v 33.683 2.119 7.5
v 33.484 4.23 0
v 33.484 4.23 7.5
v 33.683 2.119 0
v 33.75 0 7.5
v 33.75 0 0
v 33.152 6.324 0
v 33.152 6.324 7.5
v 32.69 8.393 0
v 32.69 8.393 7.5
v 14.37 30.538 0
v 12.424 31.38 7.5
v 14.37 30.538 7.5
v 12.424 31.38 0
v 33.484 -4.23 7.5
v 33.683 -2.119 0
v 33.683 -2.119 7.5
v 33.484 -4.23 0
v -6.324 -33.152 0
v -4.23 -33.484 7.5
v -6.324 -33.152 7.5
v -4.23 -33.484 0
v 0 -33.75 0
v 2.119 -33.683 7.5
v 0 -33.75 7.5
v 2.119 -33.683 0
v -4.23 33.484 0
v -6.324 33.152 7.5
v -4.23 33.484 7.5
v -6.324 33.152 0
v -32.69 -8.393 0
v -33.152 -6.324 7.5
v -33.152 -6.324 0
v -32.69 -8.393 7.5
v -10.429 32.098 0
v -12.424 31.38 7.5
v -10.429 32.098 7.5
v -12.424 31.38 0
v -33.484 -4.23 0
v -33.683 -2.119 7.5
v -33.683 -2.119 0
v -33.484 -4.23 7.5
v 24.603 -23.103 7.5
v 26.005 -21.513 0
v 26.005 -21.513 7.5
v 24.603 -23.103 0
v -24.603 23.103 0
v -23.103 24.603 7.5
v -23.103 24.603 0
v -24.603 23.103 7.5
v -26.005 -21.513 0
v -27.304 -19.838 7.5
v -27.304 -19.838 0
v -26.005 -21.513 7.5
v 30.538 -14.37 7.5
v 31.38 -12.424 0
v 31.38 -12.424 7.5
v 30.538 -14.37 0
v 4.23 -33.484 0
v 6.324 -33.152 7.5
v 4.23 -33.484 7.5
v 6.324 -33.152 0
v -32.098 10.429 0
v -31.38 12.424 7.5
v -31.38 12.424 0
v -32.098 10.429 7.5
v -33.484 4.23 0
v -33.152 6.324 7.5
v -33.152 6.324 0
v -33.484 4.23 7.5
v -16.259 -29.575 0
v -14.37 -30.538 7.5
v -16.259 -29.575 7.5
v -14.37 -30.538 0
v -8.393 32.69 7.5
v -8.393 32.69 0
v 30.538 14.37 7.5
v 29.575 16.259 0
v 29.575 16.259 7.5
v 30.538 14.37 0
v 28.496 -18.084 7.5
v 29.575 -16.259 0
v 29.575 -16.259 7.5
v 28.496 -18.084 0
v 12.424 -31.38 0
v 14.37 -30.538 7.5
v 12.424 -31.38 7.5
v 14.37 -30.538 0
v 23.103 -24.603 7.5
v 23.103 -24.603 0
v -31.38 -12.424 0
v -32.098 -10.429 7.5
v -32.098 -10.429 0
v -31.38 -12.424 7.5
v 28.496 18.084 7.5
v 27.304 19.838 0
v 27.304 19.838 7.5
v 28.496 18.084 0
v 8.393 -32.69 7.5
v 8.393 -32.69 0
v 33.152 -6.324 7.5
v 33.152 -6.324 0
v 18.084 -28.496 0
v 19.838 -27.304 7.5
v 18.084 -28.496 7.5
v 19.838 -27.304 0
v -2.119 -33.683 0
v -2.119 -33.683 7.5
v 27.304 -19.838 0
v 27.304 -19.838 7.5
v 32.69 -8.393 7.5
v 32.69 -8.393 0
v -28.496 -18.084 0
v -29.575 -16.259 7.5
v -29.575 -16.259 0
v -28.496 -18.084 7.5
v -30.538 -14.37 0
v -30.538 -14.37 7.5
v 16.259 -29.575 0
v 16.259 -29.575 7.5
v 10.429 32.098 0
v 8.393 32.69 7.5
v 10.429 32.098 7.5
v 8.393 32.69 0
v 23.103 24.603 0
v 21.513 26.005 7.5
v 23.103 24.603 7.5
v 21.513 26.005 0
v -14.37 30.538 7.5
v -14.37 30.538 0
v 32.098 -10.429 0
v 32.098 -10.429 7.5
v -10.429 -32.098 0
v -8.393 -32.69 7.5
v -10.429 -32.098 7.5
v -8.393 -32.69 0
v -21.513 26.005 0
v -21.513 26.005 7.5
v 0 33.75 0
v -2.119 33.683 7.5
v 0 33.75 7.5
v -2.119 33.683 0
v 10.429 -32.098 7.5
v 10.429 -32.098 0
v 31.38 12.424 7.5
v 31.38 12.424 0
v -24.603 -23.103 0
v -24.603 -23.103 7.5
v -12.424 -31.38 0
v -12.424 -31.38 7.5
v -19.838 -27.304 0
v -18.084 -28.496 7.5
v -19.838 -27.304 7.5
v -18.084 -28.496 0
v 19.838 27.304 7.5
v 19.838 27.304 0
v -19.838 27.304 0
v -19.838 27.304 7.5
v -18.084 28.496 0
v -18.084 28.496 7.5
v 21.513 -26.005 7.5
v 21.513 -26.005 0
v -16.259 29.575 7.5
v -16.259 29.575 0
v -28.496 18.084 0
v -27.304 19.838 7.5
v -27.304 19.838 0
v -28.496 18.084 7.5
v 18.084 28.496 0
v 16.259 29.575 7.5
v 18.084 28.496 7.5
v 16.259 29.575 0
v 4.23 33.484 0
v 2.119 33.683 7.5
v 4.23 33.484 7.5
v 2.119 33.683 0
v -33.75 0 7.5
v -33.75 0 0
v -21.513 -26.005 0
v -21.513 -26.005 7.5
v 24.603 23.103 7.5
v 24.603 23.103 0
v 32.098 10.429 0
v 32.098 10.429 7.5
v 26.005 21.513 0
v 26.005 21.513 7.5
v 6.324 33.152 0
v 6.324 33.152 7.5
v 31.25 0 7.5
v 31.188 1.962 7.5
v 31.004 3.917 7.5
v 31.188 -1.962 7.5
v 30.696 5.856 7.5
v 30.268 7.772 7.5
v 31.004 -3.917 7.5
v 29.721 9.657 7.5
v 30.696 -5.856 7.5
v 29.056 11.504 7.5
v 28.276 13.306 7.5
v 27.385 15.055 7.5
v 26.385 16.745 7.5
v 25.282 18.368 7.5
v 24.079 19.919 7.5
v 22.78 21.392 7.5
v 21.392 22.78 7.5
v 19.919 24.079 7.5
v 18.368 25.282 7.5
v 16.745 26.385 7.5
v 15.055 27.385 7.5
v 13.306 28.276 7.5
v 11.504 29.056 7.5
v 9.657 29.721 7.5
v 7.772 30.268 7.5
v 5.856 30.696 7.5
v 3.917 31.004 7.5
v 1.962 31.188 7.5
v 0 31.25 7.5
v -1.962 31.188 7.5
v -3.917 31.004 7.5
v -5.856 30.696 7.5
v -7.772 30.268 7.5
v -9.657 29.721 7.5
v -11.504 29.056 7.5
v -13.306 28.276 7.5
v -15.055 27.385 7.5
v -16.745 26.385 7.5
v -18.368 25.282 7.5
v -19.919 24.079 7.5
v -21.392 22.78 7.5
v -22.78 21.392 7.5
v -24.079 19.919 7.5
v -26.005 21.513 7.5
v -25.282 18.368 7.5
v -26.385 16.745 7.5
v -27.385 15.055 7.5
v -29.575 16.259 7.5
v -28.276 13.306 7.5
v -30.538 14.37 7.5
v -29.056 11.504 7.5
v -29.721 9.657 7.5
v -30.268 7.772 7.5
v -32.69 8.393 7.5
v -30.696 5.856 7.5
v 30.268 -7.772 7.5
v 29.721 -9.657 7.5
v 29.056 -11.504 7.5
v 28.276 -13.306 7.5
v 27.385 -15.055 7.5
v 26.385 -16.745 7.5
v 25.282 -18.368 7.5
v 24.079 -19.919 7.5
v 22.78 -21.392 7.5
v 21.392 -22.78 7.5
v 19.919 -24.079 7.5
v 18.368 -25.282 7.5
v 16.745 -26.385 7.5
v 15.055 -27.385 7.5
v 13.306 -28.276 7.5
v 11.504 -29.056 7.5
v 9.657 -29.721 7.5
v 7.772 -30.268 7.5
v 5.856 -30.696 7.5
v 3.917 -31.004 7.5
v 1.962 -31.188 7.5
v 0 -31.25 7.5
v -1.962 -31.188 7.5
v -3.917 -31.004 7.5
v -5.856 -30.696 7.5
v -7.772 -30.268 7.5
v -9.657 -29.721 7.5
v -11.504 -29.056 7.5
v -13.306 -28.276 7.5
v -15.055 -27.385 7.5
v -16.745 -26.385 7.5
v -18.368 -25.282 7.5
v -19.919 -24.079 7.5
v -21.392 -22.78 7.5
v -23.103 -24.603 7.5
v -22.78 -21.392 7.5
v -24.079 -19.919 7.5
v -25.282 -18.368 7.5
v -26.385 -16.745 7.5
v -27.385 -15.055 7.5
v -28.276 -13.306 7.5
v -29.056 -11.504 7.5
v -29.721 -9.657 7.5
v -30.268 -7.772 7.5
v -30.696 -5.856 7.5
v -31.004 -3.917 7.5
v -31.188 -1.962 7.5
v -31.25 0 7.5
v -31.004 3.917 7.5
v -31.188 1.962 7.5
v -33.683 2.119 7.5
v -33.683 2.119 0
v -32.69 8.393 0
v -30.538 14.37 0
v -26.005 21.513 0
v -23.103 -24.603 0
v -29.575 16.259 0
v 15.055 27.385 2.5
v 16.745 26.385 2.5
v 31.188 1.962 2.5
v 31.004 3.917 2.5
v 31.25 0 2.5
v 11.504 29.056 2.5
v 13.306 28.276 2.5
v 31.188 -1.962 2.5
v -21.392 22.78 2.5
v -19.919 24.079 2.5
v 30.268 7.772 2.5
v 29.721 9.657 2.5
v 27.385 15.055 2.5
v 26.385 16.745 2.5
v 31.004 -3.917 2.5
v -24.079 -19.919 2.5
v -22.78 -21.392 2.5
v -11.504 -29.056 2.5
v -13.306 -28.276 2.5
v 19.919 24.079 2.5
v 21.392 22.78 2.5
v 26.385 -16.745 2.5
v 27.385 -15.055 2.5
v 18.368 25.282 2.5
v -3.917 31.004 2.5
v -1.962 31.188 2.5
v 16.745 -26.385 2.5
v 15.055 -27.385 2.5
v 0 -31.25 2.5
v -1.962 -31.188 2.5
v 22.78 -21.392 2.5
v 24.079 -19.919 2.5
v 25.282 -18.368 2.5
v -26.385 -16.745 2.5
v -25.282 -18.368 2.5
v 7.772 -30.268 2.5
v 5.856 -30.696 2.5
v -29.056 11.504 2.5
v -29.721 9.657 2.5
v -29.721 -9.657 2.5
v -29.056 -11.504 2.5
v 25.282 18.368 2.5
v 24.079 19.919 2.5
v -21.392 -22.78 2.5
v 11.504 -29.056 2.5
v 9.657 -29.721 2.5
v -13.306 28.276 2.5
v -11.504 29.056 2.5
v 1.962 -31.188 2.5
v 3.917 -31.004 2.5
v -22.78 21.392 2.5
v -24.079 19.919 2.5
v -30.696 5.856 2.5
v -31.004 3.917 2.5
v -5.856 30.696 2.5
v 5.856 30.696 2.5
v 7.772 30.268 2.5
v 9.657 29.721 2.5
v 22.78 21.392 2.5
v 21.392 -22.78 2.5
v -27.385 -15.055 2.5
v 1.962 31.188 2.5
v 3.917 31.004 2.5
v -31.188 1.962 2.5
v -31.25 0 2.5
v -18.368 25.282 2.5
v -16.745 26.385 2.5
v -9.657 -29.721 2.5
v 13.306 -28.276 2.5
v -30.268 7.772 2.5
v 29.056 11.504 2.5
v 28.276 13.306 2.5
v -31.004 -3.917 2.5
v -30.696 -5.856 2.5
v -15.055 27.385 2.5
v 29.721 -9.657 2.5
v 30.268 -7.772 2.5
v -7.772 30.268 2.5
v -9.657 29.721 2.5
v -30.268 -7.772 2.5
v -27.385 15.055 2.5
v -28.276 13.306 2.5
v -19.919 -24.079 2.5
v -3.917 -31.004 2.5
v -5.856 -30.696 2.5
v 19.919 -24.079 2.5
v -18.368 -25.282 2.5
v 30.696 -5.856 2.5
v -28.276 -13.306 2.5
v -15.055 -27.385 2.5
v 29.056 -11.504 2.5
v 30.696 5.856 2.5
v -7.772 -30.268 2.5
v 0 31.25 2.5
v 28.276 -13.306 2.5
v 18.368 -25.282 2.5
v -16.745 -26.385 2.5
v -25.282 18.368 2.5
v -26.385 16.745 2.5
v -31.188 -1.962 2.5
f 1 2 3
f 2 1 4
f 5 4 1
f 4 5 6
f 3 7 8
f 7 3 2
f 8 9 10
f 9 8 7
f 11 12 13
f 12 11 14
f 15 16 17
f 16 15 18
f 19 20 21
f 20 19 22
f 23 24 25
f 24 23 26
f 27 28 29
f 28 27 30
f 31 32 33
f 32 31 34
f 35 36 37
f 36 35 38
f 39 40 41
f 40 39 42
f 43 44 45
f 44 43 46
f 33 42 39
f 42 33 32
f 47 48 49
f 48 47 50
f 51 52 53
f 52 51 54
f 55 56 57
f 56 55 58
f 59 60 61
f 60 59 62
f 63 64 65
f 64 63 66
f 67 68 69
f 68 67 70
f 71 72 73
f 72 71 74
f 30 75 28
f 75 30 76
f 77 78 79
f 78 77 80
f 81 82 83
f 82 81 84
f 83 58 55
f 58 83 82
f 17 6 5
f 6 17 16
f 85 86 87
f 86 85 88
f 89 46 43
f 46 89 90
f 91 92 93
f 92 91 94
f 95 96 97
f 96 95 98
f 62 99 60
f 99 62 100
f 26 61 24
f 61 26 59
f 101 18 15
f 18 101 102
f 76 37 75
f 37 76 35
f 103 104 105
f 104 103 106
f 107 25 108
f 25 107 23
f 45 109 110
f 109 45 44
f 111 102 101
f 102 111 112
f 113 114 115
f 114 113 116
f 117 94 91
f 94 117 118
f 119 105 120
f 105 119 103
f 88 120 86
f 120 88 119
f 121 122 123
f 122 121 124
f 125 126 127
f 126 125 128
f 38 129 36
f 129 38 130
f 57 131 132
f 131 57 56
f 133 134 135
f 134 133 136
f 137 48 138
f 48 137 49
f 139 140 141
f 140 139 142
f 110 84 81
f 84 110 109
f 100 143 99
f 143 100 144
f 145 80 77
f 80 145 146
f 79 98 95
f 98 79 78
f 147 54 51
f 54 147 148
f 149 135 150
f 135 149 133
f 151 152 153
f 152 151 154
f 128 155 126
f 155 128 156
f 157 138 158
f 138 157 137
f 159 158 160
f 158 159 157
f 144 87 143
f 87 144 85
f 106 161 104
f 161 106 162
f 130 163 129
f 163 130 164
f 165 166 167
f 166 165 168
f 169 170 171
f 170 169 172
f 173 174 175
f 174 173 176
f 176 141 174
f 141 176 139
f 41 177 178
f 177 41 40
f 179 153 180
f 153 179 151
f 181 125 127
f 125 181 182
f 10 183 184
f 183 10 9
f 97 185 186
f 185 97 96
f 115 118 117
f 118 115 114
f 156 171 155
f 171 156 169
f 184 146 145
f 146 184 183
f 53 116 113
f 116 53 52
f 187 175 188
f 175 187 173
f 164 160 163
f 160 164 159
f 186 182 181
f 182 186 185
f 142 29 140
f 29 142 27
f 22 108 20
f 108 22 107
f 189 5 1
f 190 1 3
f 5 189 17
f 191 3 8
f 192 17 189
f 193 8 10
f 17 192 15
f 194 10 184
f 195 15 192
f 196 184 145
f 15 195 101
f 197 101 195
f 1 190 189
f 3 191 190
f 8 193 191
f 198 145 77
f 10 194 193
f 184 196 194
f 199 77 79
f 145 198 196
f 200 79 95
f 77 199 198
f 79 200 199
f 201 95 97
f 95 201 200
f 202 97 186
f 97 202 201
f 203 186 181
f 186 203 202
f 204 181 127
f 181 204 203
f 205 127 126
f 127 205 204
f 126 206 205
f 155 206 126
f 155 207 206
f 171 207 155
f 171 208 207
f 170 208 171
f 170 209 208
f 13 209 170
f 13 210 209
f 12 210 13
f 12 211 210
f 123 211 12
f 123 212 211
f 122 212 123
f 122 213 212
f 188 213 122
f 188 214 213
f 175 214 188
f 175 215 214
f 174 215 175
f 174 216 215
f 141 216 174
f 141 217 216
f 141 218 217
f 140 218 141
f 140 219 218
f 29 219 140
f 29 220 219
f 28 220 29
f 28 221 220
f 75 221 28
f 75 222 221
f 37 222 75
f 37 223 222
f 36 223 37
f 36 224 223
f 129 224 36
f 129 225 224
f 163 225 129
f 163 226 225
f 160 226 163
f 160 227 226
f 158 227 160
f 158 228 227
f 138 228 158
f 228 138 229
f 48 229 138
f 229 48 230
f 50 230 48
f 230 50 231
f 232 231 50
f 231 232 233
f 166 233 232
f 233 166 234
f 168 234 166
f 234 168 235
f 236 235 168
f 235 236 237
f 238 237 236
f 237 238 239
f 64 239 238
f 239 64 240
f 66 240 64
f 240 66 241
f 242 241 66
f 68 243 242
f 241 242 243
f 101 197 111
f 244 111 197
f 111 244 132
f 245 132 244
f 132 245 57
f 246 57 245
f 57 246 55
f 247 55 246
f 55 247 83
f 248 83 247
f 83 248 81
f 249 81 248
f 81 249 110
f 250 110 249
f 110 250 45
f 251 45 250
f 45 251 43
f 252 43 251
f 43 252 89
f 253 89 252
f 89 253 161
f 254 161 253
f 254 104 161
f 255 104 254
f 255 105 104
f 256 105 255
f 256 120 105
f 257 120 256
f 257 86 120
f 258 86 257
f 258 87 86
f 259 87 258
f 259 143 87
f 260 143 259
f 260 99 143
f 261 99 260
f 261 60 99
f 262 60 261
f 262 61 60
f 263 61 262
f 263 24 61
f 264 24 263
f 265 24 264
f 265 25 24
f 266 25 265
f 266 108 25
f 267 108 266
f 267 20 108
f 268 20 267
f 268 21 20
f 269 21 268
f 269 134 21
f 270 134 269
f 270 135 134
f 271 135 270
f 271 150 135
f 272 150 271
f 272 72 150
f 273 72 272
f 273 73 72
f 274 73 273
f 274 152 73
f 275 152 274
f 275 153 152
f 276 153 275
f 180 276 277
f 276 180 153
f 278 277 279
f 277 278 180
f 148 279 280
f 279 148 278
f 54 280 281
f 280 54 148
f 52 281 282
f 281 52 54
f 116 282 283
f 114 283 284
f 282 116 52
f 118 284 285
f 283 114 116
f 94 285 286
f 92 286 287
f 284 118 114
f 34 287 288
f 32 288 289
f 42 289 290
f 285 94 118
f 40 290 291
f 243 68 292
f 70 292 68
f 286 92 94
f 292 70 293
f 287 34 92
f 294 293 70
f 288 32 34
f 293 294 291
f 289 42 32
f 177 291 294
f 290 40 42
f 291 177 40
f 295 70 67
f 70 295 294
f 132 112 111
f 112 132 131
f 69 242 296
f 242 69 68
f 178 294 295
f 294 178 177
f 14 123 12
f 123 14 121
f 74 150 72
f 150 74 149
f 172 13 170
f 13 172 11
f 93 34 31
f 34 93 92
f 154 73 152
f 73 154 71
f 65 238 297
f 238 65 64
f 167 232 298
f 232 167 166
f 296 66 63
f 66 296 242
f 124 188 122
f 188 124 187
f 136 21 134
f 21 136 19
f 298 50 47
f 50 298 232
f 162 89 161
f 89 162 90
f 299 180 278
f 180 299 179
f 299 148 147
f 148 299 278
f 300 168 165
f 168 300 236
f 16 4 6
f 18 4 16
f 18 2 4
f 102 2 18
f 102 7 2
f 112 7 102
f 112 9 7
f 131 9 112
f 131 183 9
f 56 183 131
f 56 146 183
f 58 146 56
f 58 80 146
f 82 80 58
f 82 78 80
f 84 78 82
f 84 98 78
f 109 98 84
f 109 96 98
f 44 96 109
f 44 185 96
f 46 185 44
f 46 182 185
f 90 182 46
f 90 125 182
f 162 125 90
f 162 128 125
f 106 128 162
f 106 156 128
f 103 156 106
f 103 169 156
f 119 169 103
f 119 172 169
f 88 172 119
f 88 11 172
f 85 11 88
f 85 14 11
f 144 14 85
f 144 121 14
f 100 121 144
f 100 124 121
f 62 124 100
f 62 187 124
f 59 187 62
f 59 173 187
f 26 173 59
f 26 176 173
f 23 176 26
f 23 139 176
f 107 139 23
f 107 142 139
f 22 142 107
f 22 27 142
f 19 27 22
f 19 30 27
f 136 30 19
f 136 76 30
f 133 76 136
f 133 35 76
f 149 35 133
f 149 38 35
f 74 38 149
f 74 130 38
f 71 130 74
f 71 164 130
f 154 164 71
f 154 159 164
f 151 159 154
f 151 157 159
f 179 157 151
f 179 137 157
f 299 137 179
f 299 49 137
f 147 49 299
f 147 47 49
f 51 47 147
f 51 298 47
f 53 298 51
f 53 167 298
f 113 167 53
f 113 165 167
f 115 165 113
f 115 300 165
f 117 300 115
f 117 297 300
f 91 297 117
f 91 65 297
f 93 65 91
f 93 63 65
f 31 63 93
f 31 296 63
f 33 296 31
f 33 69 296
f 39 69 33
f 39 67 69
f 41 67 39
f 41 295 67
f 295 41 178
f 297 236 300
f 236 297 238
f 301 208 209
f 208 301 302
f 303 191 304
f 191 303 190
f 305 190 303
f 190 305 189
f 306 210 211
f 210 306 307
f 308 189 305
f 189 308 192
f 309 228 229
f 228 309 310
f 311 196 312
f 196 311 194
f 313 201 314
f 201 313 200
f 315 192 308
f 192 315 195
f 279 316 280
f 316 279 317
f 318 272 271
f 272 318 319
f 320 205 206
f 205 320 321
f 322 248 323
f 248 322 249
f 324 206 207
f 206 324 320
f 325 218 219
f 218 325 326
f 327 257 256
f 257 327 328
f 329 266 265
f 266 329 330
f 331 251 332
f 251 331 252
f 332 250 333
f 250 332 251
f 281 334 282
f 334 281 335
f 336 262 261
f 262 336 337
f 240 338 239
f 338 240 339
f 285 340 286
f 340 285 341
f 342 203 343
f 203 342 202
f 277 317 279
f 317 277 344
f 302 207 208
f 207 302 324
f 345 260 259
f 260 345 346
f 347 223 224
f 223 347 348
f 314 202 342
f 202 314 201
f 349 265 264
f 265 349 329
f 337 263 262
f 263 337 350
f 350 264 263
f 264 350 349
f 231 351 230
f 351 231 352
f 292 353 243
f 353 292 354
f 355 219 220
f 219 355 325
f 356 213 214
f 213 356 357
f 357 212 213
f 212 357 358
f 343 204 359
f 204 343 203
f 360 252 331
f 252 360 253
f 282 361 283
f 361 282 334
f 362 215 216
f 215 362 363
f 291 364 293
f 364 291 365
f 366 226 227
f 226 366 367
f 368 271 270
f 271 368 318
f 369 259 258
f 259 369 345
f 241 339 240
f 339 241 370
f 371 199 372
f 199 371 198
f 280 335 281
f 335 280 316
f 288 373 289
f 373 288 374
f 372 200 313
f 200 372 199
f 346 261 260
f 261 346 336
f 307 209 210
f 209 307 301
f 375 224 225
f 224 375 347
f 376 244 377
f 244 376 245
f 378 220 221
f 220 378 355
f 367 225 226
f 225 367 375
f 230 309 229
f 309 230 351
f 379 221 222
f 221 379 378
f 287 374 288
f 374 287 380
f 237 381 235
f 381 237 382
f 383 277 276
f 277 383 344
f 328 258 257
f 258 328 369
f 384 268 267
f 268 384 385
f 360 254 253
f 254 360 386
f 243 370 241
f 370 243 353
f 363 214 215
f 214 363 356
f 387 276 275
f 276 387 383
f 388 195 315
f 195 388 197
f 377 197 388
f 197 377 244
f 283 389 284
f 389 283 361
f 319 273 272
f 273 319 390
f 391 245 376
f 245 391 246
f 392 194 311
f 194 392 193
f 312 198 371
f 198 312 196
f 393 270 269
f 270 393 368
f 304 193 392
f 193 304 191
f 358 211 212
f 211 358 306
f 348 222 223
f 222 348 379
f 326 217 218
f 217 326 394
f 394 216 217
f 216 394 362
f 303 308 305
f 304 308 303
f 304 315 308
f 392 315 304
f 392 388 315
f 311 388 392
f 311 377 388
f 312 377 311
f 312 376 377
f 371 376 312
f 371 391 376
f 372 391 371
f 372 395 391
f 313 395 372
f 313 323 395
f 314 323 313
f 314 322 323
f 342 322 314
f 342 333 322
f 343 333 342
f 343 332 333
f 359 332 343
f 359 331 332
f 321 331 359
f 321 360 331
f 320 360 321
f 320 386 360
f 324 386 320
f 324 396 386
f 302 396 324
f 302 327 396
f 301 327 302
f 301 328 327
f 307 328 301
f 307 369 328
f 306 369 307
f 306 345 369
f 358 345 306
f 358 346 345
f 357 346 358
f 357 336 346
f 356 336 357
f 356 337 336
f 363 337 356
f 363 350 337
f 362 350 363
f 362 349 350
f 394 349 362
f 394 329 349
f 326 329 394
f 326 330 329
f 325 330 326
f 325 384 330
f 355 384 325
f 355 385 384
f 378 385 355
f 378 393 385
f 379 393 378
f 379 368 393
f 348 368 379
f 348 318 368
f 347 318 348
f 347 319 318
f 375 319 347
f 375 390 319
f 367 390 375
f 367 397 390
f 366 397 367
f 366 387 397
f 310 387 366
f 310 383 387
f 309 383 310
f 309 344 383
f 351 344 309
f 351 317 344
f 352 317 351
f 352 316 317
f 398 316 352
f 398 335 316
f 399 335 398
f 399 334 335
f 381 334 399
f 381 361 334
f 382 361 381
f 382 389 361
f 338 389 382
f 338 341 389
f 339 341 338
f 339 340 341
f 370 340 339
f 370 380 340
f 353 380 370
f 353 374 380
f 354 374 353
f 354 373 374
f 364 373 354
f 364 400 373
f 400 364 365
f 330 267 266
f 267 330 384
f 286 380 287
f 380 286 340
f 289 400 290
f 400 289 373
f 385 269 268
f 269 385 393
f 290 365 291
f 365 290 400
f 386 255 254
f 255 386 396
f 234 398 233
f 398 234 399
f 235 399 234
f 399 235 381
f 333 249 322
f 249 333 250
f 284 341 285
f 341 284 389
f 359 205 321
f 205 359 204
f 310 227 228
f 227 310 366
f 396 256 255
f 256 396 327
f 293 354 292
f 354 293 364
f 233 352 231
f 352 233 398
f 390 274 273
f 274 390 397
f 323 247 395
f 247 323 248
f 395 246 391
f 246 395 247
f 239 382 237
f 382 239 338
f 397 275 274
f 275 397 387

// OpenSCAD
//lens cover inputs
//inside diameter of cover in millimeters
d=62.5;


//desired thickness of cover
h=2.5;

//height of rim (must be greater than h)
rh=5;

//desired thickness of rim
rt=2.5;


//default calculations (do not alter)
rh1=rh+h;
r=d/2;
r1=r+rt;
difference() {
cylinder(rh1,r=r1,true,$fn=100);
translate([0,0,h]) cylinder(10000000000,r=r,true,$fn=100);}
